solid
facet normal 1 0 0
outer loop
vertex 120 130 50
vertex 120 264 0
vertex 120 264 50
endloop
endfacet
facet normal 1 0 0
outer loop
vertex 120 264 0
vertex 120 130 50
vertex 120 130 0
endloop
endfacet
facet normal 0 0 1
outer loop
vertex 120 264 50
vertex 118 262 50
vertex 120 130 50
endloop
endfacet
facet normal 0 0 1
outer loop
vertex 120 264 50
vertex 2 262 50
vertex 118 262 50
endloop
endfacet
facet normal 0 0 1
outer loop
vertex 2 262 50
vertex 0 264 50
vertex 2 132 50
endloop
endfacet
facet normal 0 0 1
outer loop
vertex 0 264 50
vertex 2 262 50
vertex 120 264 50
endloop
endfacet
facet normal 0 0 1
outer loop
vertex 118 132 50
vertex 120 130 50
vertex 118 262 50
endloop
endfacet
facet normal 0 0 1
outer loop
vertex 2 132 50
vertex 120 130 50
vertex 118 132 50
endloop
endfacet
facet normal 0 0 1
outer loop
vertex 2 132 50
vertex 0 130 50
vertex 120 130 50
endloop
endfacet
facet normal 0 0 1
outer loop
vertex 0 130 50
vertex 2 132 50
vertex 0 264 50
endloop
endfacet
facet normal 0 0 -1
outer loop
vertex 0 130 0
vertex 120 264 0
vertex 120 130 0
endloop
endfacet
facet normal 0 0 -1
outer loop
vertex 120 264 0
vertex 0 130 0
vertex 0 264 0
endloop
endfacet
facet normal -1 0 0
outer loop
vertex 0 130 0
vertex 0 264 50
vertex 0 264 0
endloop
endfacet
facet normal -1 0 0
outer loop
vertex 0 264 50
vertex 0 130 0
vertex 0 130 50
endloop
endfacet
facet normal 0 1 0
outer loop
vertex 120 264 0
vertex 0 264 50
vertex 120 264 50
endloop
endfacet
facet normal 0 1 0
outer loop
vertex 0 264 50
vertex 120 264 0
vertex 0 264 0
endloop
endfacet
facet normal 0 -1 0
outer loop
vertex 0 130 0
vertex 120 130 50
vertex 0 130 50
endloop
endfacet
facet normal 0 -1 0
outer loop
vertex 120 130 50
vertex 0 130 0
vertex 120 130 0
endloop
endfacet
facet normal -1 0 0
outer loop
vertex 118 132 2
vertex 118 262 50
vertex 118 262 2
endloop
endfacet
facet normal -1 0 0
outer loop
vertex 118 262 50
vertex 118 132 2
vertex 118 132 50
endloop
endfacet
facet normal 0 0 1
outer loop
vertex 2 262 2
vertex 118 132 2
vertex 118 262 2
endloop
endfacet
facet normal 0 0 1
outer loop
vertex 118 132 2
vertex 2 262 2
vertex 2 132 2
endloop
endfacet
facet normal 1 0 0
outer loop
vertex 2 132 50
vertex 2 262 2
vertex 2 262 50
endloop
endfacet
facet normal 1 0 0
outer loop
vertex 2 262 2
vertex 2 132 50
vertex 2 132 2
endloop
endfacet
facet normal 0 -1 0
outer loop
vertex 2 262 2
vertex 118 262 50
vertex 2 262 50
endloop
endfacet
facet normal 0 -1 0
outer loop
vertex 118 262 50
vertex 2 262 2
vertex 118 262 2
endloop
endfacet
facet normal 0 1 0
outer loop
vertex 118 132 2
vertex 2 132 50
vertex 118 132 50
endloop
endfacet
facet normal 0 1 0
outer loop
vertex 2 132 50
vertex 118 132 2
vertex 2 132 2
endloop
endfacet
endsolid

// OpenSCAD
// include <./game_inlay_haba_302767_a_party_for_rosalie.scad>;

$fn=250;

// Spacer
difference()
{
    translate([0,130,0]) cube([120,134,50]);
    translate([2,132,2]) cube([116,130,50]);
}
